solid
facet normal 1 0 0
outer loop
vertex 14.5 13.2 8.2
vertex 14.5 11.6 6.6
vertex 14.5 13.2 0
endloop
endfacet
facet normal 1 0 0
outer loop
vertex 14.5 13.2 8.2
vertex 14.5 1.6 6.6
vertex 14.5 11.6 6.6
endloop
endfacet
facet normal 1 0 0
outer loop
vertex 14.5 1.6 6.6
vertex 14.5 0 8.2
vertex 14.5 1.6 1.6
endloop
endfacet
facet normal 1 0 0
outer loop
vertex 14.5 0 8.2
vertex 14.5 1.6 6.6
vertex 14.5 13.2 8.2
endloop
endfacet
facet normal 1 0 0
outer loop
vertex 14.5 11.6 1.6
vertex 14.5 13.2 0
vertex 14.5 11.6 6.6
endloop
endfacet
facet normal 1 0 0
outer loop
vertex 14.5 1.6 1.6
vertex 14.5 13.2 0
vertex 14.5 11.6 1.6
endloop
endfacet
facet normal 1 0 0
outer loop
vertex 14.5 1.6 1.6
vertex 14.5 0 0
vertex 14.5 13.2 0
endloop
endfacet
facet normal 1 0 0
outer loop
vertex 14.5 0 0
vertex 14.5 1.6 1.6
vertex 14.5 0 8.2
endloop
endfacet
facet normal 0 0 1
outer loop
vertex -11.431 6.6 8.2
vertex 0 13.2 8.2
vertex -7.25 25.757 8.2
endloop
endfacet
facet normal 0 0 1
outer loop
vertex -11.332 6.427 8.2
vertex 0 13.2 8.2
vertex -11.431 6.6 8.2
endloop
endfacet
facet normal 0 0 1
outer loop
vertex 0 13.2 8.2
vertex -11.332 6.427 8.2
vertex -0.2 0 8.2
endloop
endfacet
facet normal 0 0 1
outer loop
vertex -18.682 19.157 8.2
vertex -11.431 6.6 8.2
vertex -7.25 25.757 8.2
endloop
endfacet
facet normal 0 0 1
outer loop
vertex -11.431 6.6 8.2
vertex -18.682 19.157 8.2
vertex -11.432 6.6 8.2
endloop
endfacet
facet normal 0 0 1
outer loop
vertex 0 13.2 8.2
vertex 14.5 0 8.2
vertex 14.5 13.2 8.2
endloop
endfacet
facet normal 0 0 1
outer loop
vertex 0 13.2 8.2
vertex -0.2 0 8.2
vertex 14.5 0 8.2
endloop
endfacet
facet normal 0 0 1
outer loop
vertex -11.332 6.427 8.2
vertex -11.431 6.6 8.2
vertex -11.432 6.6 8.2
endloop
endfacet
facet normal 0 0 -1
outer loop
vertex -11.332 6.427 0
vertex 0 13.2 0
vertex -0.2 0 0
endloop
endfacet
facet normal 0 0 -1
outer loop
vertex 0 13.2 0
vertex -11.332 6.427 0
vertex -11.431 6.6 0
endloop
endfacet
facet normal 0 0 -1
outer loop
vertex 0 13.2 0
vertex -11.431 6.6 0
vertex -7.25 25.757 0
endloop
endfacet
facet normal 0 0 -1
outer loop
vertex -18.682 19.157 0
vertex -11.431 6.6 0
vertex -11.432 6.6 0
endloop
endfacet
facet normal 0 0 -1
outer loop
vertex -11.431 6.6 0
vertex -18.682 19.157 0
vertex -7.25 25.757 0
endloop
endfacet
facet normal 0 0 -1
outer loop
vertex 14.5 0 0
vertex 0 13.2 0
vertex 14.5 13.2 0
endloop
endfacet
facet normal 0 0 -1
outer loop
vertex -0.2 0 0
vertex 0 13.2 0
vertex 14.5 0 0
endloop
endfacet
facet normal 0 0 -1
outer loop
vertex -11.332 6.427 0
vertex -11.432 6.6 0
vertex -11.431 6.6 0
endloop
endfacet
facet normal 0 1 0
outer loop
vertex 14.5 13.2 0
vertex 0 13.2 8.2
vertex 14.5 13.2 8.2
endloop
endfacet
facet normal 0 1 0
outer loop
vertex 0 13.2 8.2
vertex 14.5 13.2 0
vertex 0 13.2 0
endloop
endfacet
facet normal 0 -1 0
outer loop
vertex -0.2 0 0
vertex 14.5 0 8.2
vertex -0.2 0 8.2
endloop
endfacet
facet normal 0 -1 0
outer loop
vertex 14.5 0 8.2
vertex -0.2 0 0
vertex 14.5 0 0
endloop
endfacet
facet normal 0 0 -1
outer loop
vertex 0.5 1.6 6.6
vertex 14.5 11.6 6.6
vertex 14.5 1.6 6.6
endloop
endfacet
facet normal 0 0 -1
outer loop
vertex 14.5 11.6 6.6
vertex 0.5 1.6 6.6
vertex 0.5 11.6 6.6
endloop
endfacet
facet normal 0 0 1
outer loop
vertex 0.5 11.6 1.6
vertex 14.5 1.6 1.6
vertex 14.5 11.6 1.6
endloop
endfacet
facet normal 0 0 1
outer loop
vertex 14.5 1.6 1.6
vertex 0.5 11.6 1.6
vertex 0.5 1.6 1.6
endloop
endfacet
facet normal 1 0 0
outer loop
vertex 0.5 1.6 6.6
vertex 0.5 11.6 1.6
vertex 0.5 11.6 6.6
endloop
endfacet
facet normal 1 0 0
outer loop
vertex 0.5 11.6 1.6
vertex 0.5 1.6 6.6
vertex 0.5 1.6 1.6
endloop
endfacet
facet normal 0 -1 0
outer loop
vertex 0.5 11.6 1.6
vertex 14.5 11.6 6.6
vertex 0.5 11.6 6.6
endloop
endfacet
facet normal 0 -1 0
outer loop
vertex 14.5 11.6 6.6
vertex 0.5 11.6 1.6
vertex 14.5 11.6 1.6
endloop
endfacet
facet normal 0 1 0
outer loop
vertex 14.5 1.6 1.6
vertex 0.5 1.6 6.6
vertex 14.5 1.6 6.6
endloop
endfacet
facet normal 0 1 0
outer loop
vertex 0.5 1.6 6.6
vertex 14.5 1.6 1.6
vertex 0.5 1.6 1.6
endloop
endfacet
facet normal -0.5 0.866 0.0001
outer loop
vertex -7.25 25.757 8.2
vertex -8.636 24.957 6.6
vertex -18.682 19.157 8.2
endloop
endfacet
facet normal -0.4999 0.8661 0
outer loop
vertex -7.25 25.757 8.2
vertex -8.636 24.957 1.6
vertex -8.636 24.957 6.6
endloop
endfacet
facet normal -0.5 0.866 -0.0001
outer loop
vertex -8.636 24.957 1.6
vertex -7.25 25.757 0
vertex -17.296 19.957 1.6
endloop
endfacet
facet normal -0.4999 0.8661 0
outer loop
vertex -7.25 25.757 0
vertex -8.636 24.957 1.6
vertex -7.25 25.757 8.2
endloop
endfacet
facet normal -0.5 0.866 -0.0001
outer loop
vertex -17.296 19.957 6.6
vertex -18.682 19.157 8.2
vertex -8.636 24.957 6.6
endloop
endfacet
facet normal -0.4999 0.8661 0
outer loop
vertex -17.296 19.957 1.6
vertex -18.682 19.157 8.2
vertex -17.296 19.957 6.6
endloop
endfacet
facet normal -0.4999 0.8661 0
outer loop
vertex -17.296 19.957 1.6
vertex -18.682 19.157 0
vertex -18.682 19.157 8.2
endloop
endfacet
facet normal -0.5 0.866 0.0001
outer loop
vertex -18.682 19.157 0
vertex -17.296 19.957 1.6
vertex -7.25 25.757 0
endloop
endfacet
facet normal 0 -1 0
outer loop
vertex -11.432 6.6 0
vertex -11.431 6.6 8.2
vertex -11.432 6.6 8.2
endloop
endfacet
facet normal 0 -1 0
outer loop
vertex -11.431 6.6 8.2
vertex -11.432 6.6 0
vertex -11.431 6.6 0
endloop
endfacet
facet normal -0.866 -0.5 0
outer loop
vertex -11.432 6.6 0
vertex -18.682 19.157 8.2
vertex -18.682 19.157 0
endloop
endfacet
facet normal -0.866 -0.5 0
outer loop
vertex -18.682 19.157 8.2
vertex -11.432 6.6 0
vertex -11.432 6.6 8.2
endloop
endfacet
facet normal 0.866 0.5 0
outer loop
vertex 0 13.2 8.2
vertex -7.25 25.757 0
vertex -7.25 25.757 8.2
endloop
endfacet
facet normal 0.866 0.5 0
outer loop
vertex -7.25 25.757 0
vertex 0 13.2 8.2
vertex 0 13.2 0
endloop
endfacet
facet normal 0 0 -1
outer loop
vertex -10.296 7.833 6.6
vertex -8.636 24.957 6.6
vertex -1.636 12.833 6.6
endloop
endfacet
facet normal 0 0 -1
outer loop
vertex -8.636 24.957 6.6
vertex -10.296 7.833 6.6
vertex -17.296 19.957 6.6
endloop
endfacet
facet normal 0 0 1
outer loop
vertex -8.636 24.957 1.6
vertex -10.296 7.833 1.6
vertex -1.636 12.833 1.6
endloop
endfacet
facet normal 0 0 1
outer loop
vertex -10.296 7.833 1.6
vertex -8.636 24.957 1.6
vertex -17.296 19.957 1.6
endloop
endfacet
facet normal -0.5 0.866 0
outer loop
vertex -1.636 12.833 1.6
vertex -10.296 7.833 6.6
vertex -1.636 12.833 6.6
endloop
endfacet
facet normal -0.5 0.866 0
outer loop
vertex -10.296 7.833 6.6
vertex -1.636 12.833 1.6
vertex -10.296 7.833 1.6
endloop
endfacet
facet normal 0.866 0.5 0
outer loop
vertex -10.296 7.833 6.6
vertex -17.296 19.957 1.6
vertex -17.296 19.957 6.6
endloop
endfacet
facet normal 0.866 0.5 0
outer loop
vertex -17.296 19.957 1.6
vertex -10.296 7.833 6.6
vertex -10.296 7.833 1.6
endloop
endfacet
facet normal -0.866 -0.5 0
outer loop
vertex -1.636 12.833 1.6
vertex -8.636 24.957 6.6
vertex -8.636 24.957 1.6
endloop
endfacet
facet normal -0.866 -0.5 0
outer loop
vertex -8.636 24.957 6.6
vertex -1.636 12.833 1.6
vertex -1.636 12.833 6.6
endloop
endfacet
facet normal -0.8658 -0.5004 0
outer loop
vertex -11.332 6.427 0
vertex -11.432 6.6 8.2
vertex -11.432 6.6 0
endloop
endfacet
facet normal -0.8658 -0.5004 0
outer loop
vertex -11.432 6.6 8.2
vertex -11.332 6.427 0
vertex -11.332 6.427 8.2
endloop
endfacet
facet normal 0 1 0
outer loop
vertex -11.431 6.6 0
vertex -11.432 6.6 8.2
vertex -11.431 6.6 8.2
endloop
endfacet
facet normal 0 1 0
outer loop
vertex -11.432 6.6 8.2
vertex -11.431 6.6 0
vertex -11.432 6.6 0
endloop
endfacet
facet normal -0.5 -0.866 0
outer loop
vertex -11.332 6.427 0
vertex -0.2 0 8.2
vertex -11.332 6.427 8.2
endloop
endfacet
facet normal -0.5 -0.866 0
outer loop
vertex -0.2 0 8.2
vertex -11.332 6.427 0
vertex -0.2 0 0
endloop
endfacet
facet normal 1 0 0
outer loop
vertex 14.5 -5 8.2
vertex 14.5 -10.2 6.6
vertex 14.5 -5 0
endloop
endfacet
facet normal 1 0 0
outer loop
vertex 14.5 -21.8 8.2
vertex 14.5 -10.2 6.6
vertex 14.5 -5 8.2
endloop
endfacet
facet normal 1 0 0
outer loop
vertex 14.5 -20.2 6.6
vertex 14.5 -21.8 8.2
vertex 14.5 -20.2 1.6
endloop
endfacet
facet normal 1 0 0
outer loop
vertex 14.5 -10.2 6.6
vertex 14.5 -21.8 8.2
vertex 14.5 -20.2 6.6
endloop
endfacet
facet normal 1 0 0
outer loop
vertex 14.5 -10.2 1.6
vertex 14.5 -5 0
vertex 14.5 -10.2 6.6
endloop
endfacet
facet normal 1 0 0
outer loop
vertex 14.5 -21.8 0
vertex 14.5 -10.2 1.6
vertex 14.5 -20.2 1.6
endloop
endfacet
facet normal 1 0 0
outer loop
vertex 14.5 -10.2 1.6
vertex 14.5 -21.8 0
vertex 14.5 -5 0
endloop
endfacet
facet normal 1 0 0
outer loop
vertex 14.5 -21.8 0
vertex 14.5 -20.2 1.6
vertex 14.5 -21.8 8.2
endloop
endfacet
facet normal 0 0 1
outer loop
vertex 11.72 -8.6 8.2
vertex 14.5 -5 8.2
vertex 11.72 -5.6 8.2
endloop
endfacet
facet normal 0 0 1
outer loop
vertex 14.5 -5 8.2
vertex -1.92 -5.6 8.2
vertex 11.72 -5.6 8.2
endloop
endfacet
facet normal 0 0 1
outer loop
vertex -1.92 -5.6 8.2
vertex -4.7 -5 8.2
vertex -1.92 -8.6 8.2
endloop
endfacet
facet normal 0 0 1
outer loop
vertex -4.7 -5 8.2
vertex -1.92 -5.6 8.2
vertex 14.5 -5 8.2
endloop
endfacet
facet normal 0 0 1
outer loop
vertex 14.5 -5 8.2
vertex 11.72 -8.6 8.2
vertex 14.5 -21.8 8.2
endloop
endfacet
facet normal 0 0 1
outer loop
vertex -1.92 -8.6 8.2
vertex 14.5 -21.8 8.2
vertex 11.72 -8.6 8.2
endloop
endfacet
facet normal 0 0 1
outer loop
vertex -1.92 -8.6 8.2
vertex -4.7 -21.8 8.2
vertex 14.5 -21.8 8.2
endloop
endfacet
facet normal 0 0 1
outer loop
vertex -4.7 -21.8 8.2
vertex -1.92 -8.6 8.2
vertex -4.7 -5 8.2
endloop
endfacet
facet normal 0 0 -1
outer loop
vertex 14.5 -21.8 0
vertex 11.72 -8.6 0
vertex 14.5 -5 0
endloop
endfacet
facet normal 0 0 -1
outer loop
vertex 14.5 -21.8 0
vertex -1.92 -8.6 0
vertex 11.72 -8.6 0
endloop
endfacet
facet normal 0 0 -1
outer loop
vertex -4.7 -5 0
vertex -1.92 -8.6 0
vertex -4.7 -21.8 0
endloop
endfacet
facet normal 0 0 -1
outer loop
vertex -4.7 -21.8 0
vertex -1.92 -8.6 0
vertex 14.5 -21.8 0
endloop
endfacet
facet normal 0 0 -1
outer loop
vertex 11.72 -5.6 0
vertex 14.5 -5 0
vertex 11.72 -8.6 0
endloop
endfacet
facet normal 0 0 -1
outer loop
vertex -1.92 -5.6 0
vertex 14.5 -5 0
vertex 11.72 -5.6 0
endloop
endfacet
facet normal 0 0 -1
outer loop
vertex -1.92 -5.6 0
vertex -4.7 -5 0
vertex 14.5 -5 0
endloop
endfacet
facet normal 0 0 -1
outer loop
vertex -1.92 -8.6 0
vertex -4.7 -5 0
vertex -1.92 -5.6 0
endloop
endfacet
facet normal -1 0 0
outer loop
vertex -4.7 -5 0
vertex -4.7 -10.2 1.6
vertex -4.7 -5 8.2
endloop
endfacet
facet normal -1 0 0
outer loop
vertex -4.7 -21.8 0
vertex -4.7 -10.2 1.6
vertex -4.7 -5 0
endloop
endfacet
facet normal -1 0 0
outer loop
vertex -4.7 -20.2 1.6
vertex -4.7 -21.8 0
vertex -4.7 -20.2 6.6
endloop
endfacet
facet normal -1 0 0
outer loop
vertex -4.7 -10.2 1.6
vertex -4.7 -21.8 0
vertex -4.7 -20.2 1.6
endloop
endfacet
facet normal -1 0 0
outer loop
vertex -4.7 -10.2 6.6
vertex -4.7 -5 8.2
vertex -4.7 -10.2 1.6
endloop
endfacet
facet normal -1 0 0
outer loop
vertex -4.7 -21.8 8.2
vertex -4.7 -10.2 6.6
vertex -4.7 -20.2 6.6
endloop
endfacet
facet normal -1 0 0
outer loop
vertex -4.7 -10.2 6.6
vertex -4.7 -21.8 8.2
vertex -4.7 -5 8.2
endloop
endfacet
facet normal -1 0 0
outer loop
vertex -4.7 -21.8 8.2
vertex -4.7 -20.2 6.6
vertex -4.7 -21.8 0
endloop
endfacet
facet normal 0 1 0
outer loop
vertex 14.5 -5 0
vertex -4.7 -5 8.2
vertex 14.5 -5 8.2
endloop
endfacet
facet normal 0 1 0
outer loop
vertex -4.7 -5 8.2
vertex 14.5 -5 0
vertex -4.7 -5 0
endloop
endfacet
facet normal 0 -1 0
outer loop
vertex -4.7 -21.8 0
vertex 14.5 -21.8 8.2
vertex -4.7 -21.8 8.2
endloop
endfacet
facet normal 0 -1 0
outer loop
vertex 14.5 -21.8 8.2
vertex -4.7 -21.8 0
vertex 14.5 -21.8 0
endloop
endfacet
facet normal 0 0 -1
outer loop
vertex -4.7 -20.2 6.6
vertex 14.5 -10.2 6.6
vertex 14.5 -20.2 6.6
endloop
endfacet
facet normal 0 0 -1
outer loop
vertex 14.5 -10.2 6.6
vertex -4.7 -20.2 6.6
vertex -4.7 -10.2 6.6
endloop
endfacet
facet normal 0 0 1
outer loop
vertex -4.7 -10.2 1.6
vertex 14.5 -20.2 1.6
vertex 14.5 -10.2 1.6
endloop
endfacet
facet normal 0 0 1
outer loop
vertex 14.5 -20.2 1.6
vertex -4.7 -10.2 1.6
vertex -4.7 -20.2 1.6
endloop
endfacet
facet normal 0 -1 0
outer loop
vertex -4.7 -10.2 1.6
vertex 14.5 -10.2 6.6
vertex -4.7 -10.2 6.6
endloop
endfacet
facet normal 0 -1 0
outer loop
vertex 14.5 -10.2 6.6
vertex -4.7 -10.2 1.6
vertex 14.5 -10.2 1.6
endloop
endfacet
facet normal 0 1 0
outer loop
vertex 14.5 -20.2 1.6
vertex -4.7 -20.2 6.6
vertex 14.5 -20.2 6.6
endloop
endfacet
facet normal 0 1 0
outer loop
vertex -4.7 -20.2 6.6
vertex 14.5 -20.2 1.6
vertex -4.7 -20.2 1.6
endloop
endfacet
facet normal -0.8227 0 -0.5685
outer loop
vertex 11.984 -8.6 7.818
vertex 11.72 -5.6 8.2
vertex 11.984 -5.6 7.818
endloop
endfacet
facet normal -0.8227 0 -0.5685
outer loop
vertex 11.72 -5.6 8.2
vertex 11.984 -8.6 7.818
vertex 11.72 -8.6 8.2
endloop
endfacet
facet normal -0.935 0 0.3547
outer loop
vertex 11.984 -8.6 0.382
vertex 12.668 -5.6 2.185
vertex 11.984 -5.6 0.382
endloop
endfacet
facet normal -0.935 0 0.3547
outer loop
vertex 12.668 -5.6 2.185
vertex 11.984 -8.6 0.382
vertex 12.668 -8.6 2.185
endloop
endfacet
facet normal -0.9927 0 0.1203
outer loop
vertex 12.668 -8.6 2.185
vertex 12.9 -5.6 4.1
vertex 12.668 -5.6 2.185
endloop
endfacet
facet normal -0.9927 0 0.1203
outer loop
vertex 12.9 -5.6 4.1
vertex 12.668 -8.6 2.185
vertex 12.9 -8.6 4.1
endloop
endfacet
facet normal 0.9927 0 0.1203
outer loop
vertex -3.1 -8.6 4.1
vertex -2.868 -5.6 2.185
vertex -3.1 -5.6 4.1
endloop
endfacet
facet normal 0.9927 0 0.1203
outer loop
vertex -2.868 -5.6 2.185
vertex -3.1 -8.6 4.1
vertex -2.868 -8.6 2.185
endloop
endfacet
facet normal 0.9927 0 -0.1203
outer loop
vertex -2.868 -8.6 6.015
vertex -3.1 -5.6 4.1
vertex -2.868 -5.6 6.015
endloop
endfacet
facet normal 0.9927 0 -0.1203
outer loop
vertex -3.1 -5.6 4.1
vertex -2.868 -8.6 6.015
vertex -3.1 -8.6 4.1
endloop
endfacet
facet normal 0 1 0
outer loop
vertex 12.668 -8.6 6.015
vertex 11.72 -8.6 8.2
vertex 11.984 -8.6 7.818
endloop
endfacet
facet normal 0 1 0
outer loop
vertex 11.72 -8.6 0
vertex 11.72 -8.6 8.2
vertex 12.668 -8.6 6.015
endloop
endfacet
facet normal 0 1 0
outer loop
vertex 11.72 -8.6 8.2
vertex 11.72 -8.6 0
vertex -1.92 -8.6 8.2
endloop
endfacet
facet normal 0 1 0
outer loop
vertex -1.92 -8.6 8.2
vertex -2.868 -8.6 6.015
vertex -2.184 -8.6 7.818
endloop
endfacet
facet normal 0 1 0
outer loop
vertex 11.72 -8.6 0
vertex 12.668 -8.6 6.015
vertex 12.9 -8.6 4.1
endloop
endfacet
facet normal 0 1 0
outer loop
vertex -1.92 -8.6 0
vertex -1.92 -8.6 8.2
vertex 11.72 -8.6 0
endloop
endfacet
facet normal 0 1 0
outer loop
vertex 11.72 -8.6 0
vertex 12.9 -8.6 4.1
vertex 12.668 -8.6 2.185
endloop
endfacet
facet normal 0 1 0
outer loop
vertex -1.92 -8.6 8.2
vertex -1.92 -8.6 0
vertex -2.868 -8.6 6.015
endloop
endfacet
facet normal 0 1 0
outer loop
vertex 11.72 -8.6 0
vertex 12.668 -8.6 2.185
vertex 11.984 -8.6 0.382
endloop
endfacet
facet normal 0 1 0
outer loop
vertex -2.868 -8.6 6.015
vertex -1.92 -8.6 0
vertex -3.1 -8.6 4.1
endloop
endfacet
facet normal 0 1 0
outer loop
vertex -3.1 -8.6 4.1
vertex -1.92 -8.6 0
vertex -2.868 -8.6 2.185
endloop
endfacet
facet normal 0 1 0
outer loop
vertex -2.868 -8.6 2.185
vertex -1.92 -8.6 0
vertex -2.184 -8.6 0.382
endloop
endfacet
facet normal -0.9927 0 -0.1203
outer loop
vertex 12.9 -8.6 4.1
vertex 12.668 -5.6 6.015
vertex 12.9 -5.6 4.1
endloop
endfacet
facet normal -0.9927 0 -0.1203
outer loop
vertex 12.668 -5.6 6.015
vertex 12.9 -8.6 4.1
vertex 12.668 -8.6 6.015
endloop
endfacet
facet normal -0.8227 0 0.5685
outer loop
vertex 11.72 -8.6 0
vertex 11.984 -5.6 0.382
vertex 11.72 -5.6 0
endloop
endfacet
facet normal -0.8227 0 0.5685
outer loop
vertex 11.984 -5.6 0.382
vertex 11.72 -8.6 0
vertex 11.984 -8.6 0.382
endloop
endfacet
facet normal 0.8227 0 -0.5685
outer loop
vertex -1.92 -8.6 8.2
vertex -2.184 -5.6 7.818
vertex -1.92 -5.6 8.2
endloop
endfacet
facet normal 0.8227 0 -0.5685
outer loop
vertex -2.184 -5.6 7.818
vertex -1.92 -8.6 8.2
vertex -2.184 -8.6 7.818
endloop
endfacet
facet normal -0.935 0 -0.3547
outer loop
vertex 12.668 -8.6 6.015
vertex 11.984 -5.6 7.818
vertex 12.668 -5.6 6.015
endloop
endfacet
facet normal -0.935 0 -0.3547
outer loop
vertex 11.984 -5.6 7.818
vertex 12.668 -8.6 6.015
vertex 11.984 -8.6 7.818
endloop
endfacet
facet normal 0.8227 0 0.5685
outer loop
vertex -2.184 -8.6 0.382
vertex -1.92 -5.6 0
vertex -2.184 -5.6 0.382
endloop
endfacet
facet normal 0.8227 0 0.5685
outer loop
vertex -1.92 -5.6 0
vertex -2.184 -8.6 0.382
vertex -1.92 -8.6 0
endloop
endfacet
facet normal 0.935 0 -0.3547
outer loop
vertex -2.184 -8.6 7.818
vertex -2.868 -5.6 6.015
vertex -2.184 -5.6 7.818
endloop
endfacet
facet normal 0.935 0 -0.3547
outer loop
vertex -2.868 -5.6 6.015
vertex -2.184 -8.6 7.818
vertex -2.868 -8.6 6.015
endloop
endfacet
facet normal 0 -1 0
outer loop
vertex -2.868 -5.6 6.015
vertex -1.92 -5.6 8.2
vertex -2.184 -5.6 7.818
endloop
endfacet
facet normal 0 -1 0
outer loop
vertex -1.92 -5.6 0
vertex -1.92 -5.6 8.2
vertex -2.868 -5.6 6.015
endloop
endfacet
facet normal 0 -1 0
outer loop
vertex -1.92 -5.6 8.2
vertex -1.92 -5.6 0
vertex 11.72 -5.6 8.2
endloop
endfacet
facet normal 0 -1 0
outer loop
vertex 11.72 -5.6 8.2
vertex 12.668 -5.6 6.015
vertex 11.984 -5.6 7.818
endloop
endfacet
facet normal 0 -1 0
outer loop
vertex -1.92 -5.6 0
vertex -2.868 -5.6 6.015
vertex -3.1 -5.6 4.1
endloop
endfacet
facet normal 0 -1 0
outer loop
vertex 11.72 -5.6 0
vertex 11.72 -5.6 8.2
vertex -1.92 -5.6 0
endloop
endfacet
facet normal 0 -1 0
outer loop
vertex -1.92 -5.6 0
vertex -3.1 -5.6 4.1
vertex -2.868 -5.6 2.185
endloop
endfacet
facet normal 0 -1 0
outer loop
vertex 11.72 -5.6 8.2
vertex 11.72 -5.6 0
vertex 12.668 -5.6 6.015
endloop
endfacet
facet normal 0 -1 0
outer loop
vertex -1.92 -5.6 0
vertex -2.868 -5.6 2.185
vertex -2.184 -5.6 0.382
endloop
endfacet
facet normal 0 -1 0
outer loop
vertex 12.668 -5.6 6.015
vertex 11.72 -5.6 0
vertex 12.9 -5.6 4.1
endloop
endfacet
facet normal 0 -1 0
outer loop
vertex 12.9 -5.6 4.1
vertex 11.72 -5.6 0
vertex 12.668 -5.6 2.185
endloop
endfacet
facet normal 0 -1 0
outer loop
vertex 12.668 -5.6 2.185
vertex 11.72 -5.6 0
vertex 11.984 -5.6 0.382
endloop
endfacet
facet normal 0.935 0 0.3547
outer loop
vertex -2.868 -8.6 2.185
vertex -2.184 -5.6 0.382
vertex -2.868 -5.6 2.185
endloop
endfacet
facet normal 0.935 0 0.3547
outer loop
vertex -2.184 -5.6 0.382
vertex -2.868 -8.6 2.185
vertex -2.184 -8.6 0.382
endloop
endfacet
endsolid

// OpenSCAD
/* [General] */
// Select the part to be viewed
part = "both"; // [corner: Corner Piece, magnetMount: Magnet Mount, both: Corner and Magnet Mount]

// Amount of Corners
corners = 6;

// Width of the cutout
width = 10;
// Height of the cutout
height = 5;
// Length of the cutout
length= 14;

// Wall thickness
walls = 1.6;
wallsInner = 0.5;
/* [Magnet Holder] */
// Magnet Diameter (I chouse this to be slightly smaller than the actual diameter so the magnet fits snuggly)
magnetDiameter = 16;
// Magnet Height
magnetHeight = 3;
// Thickness of the piece that holds the magnet (it should be thick enough to hold the structure but thin enough to have enough magnetic force)
outerWall = 0.6;

/* [Hidden] */
degrees = 360 / corners;
hull = 0.2;

outerHeight = height + walls * 2;
outerWidth = width + walls * 2;
outerLength = length + wallsInner;

magnetRadius = magnetDiameter / 2;
magnetOuterWidth = width + walls * 2 + magnetHeight + outerWall;
magnetHolderLength = magnetDiameter + walls * 2;

if(part == "corner") {
  corner();
}
if(part == "magnetMount") {
  magnetMount();
}
if(part == "both") {
  corner();
  translate([outerLength - magnetHolderLength, -magnetOuterWidth - 5, 0])
  magnetMount();
}


module magnetMount() {
  difference() {
    cube([magnetHolderLength, magnetOuterWidth, outerHeight]);
    translate([-1, walls, walls])
      cube([magnetHolderLength + 2, width, height]);
    
    translate([magnetHolderLength / 2, walls * 2 + width, outerHeight / 2])
      rotate([-90,0,0])
        cylinder(r = magnetRadius, h = magnetHeight);
  }
}

module corner() {
  part();
  translate([0, outerWidth, 0])
    rotate([0, 0, 180 - degrees])
      part();

  hull() {
    translate([0, outerWidth, 0])
      rotate([0, 0, 180 - degrees])
        translate([-hull, 0, 0])
          cube([hull, outerWidth, outerHeight]);

    translate([-hull, 0, 0])
      cube([hull, outerWidth, outerHeight]);
  }

  module part() {
    difference() {
      cube([outerLength, outerWidth, outerHeight]);
      translate([wallsInner, walls, walls])
        cube([outerLength, width, height]);
    }
  }
}
